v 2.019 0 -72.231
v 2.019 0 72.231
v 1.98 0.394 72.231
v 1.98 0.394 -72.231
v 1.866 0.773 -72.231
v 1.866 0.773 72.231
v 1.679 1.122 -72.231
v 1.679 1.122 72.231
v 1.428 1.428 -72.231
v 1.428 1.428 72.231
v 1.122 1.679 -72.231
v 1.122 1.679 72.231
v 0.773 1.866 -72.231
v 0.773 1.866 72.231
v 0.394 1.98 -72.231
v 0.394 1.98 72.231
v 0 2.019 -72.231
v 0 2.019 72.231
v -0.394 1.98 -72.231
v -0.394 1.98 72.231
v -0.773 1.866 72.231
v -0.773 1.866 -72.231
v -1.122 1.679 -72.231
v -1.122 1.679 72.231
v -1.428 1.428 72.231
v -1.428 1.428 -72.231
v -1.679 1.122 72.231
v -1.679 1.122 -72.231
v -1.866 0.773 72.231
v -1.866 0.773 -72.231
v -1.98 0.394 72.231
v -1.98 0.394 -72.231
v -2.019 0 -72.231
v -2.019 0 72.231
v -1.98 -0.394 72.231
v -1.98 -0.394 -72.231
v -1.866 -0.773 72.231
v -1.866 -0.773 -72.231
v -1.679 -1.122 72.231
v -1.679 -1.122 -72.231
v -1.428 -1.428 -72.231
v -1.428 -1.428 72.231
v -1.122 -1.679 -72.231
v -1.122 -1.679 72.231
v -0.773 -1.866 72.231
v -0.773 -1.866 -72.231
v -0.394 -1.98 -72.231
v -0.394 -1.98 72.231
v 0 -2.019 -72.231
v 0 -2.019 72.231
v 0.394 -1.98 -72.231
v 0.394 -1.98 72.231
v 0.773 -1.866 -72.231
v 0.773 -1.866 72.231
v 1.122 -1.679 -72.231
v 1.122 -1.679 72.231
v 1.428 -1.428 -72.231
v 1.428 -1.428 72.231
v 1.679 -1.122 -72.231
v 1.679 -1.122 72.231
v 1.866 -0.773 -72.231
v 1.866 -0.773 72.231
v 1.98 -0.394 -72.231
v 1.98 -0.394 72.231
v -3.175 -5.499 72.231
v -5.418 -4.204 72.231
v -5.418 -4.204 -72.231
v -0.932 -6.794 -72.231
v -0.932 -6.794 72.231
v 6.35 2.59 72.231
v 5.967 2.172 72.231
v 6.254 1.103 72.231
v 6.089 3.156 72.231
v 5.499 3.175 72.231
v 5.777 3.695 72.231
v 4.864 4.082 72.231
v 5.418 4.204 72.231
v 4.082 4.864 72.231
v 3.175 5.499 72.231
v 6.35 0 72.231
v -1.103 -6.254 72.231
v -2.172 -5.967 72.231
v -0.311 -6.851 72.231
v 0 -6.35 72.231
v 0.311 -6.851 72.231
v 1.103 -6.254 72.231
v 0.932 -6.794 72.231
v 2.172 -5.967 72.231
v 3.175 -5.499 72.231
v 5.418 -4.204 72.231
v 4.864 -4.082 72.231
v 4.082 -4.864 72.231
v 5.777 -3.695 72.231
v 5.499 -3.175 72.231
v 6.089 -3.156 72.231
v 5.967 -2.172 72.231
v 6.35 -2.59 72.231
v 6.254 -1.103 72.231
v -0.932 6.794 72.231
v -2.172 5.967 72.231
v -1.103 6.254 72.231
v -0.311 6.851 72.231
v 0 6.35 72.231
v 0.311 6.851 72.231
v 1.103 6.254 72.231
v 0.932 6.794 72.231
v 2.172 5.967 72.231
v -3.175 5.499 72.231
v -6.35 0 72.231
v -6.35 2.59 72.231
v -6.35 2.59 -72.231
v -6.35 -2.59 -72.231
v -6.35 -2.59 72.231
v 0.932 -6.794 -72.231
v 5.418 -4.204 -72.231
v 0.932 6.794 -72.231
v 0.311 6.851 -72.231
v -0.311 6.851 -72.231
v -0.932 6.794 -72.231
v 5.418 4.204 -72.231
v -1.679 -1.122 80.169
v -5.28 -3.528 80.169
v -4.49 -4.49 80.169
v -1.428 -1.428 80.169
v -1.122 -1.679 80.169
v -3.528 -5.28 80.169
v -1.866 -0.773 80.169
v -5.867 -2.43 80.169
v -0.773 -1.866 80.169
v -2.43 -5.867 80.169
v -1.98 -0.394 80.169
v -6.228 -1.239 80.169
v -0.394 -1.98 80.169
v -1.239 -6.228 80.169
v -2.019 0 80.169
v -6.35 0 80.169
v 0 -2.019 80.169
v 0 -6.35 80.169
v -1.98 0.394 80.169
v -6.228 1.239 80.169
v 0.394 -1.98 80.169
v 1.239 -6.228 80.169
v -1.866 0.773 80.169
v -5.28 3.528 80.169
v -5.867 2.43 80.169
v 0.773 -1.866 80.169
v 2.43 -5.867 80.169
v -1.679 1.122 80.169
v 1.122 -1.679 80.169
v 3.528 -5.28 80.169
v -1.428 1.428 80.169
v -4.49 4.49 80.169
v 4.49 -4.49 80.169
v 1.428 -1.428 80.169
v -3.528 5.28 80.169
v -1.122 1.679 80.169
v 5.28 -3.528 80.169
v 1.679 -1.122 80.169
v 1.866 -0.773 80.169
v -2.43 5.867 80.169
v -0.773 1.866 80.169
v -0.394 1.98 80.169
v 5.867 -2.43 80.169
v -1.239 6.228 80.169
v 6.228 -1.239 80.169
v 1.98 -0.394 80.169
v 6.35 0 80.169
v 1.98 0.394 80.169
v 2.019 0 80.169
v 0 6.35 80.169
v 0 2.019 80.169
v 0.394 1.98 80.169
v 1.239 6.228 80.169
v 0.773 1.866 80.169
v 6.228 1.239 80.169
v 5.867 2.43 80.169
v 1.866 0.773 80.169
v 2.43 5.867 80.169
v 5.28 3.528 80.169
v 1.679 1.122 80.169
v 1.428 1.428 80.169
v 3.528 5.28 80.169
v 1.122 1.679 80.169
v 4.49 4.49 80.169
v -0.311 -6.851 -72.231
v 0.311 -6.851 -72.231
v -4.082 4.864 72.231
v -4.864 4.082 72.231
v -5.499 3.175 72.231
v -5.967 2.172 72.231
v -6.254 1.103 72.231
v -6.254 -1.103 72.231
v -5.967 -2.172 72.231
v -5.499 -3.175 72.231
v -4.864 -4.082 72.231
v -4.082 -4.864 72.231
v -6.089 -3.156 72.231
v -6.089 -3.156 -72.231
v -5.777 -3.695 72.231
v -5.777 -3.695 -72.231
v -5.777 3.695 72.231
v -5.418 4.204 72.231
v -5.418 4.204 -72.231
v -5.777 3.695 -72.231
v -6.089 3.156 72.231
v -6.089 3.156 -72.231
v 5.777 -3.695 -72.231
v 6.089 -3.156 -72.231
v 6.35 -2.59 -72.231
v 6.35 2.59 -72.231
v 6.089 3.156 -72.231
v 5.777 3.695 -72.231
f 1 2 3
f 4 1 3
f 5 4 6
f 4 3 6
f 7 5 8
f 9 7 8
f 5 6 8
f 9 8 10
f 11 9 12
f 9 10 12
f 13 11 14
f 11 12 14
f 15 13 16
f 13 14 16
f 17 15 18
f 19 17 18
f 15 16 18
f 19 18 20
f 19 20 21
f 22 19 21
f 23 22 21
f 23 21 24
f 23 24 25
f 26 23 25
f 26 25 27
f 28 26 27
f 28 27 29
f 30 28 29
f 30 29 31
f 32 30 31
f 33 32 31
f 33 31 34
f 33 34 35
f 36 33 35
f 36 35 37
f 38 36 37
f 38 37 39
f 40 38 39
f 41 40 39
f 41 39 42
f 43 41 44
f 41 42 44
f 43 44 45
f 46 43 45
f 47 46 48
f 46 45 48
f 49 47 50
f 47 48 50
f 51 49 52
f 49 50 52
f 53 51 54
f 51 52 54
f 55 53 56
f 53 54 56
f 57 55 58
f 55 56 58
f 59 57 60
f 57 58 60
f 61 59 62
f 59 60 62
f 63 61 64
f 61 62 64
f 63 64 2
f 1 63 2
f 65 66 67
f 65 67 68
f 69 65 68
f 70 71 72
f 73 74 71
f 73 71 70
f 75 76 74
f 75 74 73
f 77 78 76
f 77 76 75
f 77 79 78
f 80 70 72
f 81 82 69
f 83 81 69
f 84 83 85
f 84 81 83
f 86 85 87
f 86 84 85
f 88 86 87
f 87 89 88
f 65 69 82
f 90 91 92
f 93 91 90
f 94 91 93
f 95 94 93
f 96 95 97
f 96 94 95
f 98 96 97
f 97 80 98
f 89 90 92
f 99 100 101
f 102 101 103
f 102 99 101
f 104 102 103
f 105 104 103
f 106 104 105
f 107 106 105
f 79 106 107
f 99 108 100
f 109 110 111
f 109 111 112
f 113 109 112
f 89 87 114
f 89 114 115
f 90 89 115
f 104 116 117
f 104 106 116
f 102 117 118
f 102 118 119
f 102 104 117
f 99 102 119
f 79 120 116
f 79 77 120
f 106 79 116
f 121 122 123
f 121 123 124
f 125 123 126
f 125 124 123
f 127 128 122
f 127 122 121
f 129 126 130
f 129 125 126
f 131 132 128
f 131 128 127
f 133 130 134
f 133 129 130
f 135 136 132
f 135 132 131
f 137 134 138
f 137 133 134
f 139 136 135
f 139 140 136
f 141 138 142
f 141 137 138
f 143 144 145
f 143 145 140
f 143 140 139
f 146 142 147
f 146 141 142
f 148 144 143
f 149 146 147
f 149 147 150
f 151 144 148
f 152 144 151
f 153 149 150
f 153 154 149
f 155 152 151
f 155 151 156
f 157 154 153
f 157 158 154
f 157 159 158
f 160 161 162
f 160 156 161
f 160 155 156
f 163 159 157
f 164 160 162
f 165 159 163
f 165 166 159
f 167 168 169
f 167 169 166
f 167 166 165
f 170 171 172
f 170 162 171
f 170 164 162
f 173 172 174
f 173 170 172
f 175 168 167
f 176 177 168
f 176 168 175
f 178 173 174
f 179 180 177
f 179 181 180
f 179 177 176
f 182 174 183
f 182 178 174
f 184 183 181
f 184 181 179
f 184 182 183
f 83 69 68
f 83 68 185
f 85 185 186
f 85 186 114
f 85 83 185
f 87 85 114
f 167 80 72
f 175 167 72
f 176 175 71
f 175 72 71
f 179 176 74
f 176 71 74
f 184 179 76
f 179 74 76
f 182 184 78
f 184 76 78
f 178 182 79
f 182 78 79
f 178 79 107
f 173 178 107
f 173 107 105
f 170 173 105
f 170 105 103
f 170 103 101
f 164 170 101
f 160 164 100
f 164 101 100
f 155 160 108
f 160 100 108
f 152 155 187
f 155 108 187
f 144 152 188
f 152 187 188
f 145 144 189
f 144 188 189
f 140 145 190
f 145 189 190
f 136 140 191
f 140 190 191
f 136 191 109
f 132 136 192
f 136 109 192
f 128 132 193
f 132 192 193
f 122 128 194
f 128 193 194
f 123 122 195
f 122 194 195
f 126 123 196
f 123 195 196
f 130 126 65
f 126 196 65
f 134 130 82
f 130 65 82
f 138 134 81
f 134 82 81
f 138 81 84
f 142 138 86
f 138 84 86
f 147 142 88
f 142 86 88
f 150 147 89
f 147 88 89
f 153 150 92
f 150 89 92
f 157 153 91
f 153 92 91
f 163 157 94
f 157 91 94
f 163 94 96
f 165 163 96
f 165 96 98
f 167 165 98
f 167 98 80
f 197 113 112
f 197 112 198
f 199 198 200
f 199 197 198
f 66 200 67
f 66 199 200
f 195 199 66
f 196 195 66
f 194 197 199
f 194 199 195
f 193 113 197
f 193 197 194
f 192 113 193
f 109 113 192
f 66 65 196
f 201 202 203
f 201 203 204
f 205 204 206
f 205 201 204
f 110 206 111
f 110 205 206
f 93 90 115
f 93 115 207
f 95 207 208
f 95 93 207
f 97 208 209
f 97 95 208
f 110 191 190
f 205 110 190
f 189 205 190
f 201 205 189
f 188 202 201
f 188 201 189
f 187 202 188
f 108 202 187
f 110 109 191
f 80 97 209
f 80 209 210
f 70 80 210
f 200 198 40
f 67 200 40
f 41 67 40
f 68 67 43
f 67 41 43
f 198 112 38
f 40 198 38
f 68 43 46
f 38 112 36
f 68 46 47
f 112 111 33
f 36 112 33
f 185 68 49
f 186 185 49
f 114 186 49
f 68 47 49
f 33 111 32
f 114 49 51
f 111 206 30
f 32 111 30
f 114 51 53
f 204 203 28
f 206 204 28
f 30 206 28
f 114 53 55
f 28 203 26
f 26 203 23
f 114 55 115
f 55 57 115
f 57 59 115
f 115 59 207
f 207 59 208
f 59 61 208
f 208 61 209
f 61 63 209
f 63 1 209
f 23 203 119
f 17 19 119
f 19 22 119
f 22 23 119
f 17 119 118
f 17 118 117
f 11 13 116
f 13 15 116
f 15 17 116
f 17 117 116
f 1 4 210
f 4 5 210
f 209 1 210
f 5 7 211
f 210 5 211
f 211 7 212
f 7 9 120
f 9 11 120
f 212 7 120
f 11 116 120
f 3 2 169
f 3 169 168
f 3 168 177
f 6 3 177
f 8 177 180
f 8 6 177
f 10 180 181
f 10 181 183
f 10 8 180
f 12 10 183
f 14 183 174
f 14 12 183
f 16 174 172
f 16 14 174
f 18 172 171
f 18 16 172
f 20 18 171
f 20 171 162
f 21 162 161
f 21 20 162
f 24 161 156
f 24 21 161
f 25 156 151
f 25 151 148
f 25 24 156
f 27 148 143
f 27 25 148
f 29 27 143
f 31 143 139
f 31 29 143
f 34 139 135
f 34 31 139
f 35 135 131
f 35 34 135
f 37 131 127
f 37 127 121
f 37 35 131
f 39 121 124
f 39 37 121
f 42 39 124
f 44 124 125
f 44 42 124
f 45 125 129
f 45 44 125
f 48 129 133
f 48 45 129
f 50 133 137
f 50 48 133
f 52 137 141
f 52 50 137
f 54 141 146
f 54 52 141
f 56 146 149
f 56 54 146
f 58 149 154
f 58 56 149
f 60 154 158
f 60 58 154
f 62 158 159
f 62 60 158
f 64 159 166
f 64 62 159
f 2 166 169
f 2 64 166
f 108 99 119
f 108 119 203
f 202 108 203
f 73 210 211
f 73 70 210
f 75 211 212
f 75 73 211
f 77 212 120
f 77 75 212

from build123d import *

# Parameters (mm, degrees)
BOSS_EXTRUDE1_DEPTH    = 72.23125
SKETCH2_R              = 6.35
SKETCH2_R_2            = 2.0193
BOSS_EXTRUDE2_DEPTH    = 7.9375
F_10_32_TAPPED_HOLE1_D = 4.0386


with BuildPart() as part:
    # Sketch1 → Boss-Extrude1 (new, symmetric)
    with BuildSketch(Plane.XY):
        with BuildLine():
            ThreePointArc((0.93173274, 6.79441227), (0, 6.858), (-0.93173274, 6.79441227))
            Line((-0.93173274, 6.79441227), (-5.41826726, 4.204110358))
            ThreePointArc((-5.41826726, 4.204110358), (-5.939202219, 3.429), (-6.35, 2.590301913))
            Line((-6.35, 2.590301913), (-6.35, -2.590301913))
            ThreePointArc((-6.35, -2.590301913), (-5.939202219, -3.429), (-5.41826726, -4.204110358))
            Line((-5.41826726, -4.204110358), (-0.93173274, -6.79441227))
            ThreePointArc((-0.93173274, -6.79441227), (0, -6.858), (0.93173274, -6.79441227))
            Line((0.93173274, -6.79441227), (5.41826726, -4.204110358))
            ThreePointArc((5.41826726, -4.204110358), (5.939202219, -3.429), (6.35, -2.590301913))
            Line((6.35, -2.590301913), (6.35, 2.590301913))
            ThreePointArc((6.35, 2.590301913), (5.939202219, 3.429), (5.41826726, 4.204110358))
            Line((5.41826726, 4.204110358), (0.93173274, 6.79441227))
        make_face()
    extrude(amount=BOSS_EXTRUDE1_DEPTH, both=True)

    # Sketch2 → Boss-Extrude2 (add)
    with BuildSketch(Plane.XY.offset(72.23125)):
        Circle(SKETCH2_R)
        Circle(SKETCH2_R_2, mode=Mode.SUBTRACT)
    extrude(amount=BOSS_EXTRUDE2_DEPTH)

    # #10-32 Tapped Hole1 (through all)
    with Locations(Plane(origin=(0, 0, -72.23125), x_dir=(-1, 0, 0), z_dir=(0, 0, -1))):
        with Locations((0, 0)):
            Hole(F_10_32_TAPPED_HOLE1_D / 2)


solid = part.part
